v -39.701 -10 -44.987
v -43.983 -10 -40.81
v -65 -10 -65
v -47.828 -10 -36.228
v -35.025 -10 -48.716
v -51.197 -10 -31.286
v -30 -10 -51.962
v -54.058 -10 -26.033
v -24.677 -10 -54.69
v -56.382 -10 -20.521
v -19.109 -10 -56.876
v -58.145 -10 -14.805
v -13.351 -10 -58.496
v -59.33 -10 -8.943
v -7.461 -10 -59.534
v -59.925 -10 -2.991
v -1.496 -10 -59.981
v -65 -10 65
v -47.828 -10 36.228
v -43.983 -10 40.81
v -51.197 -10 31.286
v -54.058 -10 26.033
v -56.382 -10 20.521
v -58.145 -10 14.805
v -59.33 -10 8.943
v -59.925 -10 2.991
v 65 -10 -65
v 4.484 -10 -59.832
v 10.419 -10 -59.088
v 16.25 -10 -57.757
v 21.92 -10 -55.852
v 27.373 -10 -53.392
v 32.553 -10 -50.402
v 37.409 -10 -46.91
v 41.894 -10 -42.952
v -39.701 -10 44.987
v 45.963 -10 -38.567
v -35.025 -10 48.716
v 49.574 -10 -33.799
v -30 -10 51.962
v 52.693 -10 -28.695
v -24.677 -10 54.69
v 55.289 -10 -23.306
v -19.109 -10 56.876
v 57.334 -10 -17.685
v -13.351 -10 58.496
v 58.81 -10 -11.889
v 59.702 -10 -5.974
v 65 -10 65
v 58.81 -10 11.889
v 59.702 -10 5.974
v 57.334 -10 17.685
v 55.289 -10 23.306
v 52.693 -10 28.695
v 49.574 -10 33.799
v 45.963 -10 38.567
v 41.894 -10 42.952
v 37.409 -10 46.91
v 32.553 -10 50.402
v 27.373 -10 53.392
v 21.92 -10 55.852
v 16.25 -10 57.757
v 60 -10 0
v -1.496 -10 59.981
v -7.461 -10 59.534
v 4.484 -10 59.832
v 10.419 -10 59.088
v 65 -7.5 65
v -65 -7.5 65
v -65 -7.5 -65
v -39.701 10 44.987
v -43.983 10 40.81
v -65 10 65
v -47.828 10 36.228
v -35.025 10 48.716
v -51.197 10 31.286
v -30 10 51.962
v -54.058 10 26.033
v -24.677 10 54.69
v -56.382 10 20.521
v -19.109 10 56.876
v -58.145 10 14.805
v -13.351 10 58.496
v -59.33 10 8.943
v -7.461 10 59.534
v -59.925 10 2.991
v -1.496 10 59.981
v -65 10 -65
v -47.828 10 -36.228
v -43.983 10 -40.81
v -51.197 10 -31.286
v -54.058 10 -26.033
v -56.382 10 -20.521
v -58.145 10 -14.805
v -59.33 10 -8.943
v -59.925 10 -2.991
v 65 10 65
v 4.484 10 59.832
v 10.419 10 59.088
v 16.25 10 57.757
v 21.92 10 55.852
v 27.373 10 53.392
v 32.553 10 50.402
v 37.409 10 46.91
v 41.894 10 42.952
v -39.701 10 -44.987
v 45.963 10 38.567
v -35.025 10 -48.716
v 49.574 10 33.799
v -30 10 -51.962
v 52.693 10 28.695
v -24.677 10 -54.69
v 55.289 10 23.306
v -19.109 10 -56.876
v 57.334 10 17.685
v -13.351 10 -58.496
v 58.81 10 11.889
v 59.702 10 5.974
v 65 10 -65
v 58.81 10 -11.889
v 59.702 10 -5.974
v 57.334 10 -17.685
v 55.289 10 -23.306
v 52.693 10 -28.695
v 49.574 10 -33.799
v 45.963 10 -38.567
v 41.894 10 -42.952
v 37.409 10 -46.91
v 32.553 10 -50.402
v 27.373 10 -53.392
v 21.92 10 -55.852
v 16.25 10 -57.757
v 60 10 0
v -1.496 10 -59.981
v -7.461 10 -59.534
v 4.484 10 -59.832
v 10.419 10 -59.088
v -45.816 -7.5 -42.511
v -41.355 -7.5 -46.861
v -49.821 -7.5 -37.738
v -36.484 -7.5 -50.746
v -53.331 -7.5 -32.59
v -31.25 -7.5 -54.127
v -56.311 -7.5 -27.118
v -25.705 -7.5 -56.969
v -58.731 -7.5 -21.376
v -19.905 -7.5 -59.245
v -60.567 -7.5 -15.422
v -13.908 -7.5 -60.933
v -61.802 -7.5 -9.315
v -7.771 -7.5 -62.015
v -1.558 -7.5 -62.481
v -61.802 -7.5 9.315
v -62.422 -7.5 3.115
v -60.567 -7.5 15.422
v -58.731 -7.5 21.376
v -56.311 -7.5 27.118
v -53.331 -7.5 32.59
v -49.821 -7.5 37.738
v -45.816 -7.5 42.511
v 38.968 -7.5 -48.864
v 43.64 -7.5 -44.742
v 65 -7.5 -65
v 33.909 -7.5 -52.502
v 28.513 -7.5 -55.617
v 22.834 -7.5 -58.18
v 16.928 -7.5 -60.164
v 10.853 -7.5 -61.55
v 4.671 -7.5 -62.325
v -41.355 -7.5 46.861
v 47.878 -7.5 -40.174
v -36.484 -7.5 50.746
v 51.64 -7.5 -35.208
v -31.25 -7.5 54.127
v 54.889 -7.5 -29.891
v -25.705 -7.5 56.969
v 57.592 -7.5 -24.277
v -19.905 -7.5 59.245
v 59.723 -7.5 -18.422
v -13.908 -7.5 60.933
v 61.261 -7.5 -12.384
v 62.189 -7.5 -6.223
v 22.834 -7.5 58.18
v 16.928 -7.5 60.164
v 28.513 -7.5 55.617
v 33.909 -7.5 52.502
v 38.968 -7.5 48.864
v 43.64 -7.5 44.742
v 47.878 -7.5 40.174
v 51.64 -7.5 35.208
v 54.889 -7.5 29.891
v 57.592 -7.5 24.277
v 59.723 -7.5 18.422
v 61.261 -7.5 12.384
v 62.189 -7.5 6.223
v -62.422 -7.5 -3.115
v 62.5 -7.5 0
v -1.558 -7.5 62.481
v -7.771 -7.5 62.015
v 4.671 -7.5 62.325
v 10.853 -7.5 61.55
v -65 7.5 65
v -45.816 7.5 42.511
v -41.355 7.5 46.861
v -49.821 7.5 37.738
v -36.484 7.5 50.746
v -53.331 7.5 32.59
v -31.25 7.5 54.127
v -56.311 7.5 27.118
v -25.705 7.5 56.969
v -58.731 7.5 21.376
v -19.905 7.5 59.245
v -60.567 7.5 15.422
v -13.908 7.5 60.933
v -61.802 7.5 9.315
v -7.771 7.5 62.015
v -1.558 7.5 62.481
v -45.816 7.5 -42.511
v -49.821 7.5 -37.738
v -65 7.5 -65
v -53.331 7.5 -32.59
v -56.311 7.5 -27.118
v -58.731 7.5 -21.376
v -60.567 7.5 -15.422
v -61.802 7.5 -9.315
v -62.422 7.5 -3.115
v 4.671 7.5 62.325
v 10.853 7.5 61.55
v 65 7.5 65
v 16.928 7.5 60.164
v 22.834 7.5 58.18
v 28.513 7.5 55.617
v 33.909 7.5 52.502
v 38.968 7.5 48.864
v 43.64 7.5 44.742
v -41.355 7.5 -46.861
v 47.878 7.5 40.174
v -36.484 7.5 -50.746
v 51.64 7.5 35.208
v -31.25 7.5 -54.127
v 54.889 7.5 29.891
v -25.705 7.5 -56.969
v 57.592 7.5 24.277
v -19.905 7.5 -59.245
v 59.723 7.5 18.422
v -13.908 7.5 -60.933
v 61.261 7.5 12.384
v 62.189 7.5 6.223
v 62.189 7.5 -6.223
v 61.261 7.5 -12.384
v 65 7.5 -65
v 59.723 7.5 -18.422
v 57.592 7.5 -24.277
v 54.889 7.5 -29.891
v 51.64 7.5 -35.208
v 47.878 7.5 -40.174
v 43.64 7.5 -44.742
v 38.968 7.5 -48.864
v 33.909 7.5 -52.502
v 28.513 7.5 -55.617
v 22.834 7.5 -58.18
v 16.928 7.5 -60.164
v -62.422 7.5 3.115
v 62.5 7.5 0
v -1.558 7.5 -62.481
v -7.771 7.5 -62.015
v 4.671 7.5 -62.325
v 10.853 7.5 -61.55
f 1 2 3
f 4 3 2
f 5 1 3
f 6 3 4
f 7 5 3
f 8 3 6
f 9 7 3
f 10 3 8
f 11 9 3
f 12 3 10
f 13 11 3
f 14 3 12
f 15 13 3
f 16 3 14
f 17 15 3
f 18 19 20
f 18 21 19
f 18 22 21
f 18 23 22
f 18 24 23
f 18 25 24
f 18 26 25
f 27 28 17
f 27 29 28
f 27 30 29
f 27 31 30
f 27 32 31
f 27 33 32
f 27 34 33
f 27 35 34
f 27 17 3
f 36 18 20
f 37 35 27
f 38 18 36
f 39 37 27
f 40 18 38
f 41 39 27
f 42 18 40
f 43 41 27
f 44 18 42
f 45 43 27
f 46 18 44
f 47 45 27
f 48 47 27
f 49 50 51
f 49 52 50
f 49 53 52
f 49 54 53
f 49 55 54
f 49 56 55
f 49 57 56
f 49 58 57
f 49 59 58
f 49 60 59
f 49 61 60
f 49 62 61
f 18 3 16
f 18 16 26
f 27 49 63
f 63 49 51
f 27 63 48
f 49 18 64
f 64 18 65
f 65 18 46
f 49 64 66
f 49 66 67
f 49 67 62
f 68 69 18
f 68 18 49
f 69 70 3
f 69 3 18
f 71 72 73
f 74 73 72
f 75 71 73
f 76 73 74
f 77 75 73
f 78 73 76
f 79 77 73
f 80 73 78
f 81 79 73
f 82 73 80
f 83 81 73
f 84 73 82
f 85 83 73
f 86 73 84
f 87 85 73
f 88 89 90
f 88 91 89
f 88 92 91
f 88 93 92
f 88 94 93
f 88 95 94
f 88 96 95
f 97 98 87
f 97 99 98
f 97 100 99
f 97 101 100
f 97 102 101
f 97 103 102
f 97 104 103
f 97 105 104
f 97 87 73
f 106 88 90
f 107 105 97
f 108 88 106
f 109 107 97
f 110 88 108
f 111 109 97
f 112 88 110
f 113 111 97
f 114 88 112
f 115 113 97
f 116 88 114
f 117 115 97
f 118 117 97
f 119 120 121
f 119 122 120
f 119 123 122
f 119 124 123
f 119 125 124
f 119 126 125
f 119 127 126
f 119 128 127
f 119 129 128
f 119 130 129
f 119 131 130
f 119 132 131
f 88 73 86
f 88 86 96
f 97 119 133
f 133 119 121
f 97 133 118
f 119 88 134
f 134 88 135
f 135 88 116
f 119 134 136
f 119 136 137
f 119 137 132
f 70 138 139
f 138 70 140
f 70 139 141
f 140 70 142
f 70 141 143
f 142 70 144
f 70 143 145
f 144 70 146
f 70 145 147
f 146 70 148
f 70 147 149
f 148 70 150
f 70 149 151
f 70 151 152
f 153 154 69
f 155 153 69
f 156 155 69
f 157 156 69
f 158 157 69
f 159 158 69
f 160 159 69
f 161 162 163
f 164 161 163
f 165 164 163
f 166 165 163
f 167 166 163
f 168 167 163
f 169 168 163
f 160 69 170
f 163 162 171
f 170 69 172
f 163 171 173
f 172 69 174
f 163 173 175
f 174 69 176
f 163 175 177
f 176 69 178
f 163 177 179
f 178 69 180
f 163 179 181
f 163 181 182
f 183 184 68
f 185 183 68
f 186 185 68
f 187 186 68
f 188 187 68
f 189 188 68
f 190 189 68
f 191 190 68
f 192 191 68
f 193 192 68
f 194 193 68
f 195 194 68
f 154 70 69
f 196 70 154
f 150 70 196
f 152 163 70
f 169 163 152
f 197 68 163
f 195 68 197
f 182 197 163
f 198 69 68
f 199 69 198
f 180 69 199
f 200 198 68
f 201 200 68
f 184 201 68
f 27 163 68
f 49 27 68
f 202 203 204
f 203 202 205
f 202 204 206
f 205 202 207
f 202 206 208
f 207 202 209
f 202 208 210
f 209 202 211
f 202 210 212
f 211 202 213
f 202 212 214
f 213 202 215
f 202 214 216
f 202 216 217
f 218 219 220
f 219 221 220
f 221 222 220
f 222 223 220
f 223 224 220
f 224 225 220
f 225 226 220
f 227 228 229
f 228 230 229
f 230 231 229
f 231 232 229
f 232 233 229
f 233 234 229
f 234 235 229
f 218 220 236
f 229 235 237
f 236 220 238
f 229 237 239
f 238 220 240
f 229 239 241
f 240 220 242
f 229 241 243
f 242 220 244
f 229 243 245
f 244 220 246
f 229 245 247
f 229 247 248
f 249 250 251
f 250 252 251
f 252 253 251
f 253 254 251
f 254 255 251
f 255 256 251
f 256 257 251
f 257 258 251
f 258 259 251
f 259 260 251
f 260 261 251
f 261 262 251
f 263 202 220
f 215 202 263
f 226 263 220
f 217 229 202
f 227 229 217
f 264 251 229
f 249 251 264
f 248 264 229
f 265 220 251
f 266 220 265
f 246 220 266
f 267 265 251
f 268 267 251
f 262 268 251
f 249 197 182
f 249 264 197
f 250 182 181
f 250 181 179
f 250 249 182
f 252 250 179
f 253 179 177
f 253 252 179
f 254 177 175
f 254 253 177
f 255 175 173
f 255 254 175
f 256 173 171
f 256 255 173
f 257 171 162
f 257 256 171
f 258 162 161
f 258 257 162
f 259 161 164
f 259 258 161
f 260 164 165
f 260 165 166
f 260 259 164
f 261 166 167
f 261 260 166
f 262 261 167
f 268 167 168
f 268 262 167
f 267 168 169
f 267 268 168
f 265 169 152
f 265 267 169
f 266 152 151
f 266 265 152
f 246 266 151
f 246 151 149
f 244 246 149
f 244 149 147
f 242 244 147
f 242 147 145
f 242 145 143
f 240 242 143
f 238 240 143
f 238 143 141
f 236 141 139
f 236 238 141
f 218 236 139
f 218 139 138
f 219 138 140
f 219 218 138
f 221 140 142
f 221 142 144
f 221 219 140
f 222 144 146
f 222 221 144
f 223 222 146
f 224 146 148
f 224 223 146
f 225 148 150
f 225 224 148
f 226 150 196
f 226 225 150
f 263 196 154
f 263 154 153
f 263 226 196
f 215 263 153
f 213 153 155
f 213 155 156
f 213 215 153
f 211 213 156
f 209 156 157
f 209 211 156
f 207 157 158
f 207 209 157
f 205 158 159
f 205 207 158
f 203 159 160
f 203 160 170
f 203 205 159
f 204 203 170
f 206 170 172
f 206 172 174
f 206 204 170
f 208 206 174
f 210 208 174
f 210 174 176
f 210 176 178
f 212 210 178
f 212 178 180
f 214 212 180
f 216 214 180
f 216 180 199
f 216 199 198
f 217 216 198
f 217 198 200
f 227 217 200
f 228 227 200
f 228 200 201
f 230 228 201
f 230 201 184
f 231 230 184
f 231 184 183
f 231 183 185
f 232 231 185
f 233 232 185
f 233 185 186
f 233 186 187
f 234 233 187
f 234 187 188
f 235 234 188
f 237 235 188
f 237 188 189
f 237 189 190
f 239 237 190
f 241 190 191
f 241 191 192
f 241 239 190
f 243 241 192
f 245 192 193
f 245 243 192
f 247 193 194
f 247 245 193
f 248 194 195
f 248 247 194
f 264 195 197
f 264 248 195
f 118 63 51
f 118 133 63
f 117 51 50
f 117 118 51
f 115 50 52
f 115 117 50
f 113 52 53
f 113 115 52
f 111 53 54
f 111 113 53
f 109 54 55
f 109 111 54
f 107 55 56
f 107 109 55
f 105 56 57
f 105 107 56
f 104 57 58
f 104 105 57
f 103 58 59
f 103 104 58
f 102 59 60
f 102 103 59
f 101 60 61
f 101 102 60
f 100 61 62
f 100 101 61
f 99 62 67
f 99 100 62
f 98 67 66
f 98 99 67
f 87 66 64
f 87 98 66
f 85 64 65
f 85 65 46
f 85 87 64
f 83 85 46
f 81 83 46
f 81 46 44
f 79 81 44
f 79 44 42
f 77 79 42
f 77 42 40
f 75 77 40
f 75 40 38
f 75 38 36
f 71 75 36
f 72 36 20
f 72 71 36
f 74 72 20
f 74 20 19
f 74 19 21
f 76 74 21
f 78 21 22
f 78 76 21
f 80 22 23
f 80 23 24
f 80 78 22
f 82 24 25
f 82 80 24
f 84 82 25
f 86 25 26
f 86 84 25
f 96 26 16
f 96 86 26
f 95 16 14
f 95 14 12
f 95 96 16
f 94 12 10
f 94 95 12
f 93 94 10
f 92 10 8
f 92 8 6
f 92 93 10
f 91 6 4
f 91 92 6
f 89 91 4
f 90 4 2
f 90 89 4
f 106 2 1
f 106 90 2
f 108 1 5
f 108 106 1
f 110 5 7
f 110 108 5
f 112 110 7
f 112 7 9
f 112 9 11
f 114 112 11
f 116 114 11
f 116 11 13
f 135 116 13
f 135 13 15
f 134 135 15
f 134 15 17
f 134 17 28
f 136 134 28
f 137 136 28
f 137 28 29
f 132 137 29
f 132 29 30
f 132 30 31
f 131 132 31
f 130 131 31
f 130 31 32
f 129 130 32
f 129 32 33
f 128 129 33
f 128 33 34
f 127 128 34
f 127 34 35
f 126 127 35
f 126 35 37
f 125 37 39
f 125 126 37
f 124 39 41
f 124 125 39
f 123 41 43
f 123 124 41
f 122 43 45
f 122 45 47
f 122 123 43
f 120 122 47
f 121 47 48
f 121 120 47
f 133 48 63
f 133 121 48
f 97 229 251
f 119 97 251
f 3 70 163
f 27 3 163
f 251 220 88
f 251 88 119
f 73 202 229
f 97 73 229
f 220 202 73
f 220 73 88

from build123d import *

# Parameters (mm, degrees)
SKETCH1_R           = 62.5
SKETCH1_R_2         = 60
BOSS_EXTRUDE1_DEPTH = 7.5
SKETCH3_W           = 130
SKETCH3_H           = 130
SKETCH3_R           = 60
BOSS_EXTRUDE2_DEPTH = 2.5
SKETCH4_W           = 130
SKETCH4_H           = 130
SKETCH4_R           = 60
BOSS_EXTRUDE3_DEPTH = 2.5


with BuildPart() as part:
    # Sketch1 → Boss-Extrude1 (new body, symmetric)
    with BuildSketch(Plane(origin=(0, 0, 0), x_dir=(1, 0, 0), z_dir=(0, 1, 0))):
        Circle(SKETCH1_R)
        Circle(SKETCH1_R_2, mode=Mode.SUBTRACT)
    extrude(amount=BOSS_EXTRUDE1_DEPTH, both=True)

    # Sketch3 → Boss-Extrude2 (add)
    with BuildSketch(Plane(origin=(0, 7.5, 0), x_dir=(1, 0, 0), z_dir=(0, 1, 0))):
        Rectangle(SKETCH3_W, SKETCH3_H)
        Circle(SKETCH3_R, mode=Mode.SUBTRACT)
    extrude(amount=BOSS_EXTRUDE2_DEPTH)

    # Sketch4 → Boss-Extrude3 (add)
    with BuildSketch(Plane.XZ.offset(7.5)):
        Rectangle(SKETCH4_W, SKETCH4_H)
        Circle(SKETCH4_R, mode=Mode.SUBTRACT)
    extrude(amount=BOSS_EXTRUDE3_DEPTH)


solid = part.part
